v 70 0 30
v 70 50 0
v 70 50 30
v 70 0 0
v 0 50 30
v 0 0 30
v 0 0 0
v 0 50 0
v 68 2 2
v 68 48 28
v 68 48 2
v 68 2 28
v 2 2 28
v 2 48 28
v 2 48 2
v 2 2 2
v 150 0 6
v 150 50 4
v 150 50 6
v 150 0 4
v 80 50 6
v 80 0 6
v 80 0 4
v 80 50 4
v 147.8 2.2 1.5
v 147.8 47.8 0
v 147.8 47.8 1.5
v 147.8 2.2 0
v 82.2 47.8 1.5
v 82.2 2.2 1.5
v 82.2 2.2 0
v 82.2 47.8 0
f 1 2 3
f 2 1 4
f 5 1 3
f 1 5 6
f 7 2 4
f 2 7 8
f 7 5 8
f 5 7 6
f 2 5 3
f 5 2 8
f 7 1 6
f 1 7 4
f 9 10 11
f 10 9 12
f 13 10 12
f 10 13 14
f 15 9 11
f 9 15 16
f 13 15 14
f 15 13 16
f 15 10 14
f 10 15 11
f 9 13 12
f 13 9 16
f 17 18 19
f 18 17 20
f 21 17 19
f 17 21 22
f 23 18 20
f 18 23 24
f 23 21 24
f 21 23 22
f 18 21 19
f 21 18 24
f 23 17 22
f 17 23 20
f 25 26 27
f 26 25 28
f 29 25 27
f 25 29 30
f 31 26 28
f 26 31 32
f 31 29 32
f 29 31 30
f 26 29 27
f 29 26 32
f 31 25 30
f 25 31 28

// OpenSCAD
// Two-part enclosure for electronics board.
// Part 1: Box (left) - 70x50x30mm outer, 2mm walls/floor, open top.
// Part 2: Lid (right) - 70x50x2mm plate with 4mm tall lip (1.5mm wall), 65.6x45.6mm outer lip.
// Parts are side-by-side with a 10mm gap. Lid is printed upside down (lip facing down) to slide in.

// Dimensions
BOX_X  = 70;
BOX_Y  = 50;
BOX_Z  = 30;
WALL   = 2;
FLOOR  = 2;

LID_PLATE_X = 70;
LID_PLATE_Y = 50;
LID_PLATE_Z = 2;

LIP_WALL_THICKNESS = 1.5;
LIP_HEIGHT = 4;
LIP_OUT_X = 65.6;
LIP_OUT_Y = 45.6;

// Gap between parts
GAP = 10;

// Derived dimensions for the box
BOX_IN_X = BOX_X - 2 * WALL;
BOX_IN_Y = BOX_Y - 2 * WALL;
BOX_IN_Z = BOX_Z - FLOOR; // Open top, so height is just wall + floor

// Derived dimensions for the lid lip
// Lip outer size is 65.6 x 45.6. Plate is 70 x 50.
// Clearance = (70 - 65.6) / 2 = 2.2 mm total, 1.1 mm each side.
// Clearance = (50 - 45.6) / 2 = 2.2 mm total, 1.1 mm each side.
// The prompt asks for 0.2 mm clearance. Let's re-read carefully.
// "whose outer size is 65.6 x 45.6 mm... so it slides into the box opening with 0.2 mm clearance on each side."
// Box opening is 66 x 46 (70-2*2, 50-2*2).
// Lip outer is 65.6 x 45.6.
// Gap between Lip Outer and Box Inner = (66 - 65.6) / 2 = 0.2 mm. Correct.

$fn = 64;

// --- Part 1: The Box ---
// Constructed by extruding a 2D profile.
// Profile: Bottom wall (FLOOR), Side walls (WALL), Top opening.
// We build the solid block and subtract the empty space inside.

difference() {
    // Main block
    translate([0, 0, 0]) 
        cube([BOX_X, BOX_Y, BOX_Z]);
    
    // Cut out the empty interior
    // Interior dimensions:
    // X: from WALL to BOX_X - WALL
    // Y: from WALL to BOX_Y - WALL
    // Z: from FLOOR to BOX_Z - WALL (since top is open)
    
    translate([WALL, WALL, FLOOR]) 
        cube([BOX_IN_X, BOX_IN_Y, BOX_IN_Z - WALL]);
}

// --- Part 2: The Lid ---
// Constructed as a plate with a lip.
// The lid is printed upside down relative to the box opening, meaning the lip faces the box.
// However, the prompt says "Place the lid on the +X side of the box".
// If the lid is printed "upside down" (lip facing down), and placed on +X, it will sit next to the box.
// To slide it in, the user would flip it over after printing, or the design implies the lip is the bottom surface.
// Given "printed upside down: a plate ... with a rectangular lip on top of it", this phrasing is slightly ambiguous.
// Usually, "printed upside down" means the part is inverted in Z.
// Let's interpret: The physical part has a plate and a lip. The lip is 4mm tall.
// If printed normally, lip is up. If printed upside down, lip is down.
// To slide into the box (which has an open top), the lip must be the bottom surface of the lid assembly.
// So we model the lid with the lip extending downwards from the plate.

module lid() {
    // Plate base
    translate([0, 0, 0]) 
        cube([LID_PLATE_X, LID_PLATE_Y, LID_PLATE_Z]);
    
    // Lip
    // The lip is on the plate. If printed upside down, the lip extends in -Z direction.
    // Lip outer size: 65.6 x 45.6.
    // Lip thickness: 1.5.
    // Lip height: 4.
    // Centered on the plate.
    
    translate([
        (LID_PLATE_X - LIP_OUT_X) / 2,
        (LID_PLATE_Y - LIP_OUT_Y) / 2,
        -LIP_HEIGHT // Extend downwards
    ]) 
        cube([LIP_OUT_X, LIP_OUT_Y, LIP_WALL_THICKNESS]);
}

// --- Assembly ---
// Place Box at origin.
// Place Lid on +X side with GAP.
// Lid is placed such that its lip faces the box (downwards in Z relative to the lid's local frame if we consider the plate as top, but here we built the lip down).
// Since we built the lip down from the plate, and we place the lid next to the box, the lip will be adjacent to the box opening.

translate([0, 0, 0])
    difference() {
        // Box
        translate([0, 0, 0]) 
            cube([BOX_X, BOX_Y, BOX_Z]);
        
        // Interior of box
        translate([WALL, WALL, FLOOR]) 
            cube([BOX_IN_X, BOX_IN_Y, BOX_IN_Z - WALL]);
    }

translate([BOX_X + GAP, 0, LIP_HEIGHT])
    lid();
